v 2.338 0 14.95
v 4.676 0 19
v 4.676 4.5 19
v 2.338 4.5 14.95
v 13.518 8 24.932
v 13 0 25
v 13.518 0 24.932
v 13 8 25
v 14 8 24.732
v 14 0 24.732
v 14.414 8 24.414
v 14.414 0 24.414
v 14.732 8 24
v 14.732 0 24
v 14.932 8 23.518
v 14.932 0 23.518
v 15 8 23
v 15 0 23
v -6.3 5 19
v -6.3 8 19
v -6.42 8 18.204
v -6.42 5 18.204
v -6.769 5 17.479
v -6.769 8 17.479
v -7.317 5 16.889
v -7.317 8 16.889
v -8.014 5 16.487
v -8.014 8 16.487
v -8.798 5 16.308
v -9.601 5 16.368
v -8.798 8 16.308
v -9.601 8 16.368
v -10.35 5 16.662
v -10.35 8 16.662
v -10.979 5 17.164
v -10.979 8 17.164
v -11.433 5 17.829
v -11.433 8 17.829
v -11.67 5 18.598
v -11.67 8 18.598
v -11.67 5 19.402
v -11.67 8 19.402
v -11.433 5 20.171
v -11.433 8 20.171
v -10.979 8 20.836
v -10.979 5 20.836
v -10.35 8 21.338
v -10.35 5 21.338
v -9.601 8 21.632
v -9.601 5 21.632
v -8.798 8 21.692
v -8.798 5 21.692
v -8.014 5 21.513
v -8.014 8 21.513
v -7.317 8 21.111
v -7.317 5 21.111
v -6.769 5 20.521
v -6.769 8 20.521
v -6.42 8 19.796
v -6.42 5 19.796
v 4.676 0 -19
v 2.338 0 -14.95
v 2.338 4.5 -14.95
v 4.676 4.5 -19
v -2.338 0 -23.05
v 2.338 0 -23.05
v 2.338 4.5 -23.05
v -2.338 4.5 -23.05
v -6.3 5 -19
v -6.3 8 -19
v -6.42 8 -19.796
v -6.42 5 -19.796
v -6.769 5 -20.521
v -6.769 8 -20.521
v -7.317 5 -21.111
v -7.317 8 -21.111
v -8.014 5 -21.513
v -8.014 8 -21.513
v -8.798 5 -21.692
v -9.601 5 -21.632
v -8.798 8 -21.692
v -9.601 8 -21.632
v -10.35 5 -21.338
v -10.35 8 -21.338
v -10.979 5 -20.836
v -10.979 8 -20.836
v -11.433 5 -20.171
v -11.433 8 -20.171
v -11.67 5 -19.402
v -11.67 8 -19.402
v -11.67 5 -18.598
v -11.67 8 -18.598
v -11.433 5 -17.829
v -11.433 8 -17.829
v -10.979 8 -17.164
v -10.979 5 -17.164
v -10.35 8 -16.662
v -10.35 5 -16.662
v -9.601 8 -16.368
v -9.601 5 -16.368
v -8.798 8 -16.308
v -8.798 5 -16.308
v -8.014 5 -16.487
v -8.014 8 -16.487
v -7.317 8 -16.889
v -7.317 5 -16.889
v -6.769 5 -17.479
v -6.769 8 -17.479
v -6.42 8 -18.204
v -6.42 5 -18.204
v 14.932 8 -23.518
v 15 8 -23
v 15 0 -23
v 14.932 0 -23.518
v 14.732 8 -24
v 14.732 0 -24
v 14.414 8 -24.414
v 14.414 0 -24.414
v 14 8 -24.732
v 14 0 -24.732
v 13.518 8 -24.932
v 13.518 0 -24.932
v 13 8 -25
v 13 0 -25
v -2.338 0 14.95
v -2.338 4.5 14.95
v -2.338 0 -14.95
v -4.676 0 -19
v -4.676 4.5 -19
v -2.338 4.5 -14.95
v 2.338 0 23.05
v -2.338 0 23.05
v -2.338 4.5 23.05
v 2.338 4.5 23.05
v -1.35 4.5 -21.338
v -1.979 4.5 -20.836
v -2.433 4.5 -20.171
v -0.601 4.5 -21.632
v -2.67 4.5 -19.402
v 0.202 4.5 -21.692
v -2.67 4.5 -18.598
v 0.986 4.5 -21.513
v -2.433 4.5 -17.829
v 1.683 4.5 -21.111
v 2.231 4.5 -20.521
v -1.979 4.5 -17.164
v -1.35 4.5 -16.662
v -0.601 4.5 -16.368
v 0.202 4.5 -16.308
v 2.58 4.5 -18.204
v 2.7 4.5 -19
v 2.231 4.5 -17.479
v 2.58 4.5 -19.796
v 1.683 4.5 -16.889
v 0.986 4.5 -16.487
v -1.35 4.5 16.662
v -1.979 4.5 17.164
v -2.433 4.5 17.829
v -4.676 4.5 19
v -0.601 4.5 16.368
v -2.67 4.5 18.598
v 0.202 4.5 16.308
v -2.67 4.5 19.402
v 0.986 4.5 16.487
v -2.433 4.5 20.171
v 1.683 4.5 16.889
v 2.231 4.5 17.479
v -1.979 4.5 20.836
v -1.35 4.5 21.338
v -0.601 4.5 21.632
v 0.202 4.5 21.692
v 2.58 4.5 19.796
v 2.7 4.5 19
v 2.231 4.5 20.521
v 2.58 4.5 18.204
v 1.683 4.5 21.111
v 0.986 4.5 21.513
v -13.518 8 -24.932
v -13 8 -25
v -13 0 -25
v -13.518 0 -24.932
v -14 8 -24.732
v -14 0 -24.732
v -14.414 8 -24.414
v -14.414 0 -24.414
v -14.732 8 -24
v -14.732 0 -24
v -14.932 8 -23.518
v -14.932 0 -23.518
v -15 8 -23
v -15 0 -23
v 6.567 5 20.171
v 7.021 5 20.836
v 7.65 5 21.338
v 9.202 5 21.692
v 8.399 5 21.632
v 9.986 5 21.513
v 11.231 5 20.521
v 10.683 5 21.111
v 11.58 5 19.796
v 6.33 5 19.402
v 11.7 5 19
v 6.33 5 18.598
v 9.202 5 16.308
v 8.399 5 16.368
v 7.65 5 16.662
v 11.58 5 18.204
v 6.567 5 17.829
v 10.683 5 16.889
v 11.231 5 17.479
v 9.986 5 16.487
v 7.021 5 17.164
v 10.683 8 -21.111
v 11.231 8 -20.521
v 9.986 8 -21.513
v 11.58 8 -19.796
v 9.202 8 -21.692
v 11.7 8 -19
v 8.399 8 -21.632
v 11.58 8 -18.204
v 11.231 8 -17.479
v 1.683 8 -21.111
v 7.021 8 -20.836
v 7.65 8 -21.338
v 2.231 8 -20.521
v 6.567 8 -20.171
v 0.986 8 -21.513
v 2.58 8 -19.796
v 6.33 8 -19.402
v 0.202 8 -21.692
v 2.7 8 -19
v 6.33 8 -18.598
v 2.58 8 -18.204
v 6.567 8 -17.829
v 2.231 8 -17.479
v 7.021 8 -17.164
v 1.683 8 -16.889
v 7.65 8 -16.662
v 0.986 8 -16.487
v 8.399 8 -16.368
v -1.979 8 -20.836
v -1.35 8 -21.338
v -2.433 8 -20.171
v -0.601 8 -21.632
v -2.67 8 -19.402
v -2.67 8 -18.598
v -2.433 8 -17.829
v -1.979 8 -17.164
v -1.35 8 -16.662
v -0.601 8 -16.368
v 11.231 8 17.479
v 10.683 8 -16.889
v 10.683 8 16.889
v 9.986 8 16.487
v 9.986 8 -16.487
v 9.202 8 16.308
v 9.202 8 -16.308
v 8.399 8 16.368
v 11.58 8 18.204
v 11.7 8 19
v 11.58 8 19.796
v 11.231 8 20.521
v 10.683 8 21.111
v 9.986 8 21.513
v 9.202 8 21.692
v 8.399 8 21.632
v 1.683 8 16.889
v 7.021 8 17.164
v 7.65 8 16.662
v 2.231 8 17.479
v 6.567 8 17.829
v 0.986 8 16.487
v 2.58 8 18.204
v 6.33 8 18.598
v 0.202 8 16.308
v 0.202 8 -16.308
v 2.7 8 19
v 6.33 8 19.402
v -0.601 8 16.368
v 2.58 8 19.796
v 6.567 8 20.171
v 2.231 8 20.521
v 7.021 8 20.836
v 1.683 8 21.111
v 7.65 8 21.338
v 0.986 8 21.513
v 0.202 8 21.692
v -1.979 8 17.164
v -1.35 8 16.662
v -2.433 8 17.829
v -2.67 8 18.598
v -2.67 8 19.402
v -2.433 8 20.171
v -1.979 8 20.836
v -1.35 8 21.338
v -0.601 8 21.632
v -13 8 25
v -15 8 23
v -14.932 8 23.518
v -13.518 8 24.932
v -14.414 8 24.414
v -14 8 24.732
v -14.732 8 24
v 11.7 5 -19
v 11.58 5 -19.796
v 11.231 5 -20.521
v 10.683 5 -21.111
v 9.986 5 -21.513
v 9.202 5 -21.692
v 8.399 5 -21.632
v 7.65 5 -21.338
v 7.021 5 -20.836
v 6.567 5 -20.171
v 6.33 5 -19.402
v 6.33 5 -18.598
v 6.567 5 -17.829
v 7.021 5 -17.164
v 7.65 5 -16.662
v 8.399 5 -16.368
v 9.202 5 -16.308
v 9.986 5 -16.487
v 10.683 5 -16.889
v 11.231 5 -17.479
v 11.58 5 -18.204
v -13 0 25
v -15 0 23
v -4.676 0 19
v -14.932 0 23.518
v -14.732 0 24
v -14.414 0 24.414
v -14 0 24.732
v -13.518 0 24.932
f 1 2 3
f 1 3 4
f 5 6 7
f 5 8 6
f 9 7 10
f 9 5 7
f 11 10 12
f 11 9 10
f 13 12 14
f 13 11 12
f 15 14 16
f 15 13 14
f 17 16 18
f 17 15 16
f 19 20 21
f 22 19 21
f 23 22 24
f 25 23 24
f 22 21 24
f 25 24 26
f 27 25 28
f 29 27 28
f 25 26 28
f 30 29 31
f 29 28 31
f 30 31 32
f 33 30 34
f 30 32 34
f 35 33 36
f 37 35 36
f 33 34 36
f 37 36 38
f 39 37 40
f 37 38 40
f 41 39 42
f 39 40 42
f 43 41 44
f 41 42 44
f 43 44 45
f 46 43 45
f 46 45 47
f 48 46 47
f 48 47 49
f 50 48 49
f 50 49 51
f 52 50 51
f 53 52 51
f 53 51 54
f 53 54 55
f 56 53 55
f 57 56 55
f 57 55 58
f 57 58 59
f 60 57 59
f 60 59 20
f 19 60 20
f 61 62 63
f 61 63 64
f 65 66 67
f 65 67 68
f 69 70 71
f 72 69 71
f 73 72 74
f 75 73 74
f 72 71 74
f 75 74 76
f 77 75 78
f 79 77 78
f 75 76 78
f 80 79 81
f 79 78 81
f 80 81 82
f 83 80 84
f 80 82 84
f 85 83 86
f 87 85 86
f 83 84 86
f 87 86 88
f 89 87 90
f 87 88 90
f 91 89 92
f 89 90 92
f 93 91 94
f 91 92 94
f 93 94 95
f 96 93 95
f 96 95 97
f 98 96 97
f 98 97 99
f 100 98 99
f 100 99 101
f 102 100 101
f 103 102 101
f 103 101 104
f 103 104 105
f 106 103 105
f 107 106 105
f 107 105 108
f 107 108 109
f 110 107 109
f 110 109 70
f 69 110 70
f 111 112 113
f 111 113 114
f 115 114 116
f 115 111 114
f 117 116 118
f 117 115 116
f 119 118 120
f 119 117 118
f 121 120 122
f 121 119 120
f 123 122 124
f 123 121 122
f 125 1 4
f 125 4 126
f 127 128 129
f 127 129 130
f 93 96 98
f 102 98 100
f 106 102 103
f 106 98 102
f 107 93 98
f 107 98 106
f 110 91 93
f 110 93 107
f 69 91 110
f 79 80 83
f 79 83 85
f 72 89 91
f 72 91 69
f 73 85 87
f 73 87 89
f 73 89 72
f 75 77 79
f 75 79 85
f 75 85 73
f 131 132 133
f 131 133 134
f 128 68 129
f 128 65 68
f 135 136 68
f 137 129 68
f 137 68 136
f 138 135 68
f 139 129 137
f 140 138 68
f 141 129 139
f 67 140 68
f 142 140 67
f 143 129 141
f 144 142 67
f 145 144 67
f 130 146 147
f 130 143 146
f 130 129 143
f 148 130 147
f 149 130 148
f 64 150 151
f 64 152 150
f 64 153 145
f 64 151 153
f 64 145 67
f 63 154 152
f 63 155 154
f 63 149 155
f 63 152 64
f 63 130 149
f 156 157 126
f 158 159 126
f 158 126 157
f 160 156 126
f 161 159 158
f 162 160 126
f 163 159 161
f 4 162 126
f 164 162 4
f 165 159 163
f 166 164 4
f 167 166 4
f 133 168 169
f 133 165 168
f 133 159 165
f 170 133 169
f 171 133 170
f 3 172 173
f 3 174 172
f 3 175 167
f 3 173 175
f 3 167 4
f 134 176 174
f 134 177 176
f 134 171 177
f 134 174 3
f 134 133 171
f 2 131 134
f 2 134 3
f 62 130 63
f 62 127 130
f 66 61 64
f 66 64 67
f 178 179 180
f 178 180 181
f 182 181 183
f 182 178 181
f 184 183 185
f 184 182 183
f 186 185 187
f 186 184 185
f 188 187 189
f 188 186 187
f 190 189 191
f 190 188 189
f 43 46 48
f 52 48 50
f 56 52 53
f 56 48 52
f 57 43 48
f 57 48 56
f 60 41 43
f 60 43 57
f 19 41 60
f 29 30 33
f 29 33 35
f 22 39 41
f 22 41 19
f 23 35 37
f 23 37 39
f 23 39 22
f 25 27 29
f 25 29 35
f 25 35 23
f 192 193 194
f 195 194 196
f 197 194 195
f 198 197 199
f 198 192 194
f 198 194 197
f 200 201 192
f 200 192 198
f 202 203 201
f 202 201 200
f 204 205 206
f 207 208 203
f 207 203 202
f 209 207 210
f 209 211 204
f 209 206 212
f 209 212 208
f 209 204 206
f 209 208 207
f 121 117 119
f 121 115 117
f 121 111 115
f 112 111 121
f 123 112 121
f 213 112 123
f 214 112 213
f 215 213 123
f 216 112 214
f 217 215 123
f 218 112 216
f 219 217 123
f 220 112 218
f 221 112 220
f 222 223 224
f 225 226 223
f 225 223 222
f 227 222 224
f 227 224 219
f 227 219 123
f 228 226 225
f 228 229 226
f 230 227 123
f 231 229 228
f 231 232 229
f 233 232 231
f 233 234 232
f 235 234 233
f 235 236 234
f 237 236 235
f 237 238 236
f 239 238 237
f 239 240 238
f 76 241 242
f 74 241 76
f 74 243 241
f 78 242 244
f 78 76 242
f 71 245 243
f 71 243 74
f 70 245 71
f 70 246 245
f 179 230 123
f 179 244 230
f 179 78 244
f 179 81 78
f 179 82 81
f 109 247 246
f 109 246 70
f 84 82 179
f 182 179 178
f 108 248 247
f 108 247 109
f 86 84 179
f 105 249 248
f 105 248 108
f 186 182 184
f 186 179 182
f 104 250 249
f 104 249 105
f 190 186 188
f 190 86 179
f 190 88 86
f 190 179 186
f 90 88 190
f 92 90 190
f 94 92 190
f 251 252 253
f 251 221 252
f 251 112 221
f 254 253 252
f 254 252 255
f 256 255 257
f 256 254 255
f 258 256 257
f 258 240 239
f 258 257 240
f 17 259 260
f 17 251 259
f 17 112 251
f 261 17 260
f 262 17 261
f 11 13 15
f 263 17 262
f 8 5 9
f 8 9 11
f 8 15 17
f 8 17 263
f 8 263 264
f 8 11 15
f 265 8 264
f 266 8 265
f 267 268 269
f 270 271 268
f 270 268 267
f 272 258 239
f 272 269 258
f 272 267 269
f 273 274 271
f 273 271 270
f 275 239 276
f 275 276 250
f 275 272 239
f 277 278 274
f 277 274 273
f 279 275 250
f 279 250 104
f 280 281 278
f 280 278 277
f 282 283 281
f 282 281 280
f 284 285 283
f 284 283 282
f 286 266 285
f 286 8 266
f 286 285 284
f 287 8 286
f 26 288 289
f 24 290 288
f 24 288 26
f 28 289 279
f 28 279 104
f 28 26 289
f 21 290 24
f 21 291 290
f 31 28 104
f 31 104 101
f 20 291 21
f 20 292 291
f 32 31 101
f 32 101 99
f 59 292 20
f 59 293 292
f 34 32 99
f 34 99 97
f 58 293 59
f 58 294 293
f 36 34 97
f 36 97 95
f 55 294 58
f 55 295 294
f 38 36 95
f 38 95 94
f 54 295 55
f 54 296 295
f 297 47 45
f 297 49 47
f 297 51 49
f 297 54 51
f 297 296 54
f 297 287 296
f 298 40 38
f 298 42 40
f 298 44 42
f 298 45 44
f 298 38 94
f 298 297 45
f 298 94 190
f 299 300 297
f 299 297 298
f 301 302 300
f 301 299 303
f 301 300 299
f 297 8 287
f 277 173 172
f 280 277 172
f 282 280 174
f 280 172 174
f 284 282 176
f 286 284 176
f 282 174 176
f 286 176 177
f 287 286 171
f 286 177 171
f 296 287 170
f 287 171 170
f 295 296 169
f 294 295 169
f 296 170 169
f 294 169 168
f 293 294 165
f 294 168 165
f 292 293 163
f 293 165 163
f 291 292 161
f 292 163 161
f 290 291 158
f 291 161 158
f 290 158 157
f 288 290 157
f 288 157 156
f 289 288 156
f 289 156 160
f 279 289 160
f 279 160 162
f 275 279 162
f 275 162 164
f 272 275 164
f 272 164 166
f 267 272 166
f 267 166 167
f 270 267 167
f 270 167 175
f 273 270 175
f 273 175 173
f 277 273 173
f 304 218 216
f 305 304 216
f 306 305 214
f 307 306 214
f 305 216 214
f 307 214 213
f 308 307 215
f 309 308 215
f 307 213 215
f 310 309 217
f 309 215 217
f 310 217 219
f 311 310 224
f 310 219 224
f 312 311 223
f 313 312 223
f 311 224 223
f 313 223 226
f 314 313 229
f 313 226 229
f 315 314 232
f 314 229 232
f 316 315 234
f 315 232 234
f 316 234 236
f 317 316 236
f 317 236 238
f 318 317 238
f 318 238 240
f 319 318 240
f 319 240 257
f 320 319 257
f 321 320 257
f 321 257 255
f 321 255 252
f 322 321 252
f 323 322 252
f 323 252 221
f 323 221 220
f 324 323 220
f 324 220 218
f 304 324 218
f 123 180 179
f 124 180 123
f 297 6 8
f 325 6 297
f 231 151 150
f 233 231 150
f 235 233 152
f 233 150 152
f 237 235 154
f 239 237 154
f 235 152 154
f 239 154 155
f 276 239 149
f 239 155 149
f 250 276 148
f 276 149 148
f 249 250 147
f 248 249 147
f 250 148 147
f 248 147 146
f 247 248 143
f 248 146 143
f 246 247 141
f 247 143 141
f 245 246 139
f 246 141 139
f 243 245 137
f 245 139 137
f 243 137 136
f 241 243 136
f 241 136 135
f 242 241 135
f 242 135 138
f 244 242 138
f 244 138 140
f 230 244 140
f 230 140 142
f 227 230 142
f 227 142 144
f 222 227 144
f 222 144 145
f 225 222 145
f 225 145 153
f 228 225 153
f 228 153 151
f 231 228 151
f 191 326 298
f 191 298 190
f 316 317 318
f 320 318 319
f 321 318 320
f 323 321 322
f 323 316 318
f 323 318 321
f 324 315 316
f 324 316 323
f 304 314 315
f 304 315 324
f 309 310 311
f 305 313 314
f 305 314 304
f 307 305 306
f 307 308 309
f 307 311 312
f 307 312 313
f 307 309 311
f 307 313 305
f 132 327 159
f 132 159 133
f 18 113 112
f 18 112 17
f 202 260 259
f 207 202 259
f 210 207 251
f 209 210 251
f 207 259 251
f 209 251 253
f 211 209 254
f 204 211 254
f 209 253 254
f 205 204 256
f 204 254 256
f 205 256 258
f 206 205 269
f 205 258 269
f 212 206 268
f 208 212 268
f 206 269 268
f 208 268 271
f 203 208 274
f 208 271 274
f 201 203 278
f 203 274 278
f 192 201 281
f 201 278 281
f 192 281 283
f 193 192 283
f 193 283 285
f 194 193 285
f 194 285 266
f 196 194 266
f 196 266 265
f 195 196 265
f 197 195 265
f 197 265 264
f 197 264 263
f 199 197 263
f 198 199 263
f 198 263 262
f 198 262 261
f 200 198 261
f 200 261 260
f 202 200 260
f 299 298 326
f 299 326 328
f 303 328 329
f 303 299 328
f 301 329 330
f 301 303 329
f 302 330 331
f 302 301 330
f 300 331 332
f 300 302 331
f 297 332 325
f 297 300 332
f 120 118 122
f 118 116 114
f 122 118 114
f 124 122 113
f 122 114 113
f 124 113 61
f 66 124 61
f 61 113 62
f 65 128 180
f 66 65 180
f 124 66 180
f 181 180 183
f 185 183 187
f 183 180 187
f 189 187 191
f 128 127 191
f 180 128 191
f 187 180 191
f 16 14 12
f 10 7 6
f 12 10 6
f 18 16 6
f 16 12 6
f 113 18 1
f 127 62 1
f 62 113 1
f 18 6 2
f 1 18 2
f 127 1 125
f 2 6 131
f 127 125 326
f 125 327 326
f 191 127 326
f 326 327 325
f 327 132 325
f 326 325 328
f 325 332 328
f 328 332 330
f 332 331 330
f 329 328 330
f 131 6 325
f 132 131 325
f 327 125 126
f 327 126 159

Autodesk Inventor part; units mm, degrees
ref_plane "YZ Plane" through (0, 0, 0) normal (1, 0, 0) x (0, 1, 0)
ref_plane "XZ Plane" through (0, 0, 0) normal (0, 1, 0) x (-1, 0, 0)
ref_plane "XY Plane" through (0, 0, 0) normal (0, 0, 1) x (1, 0, 0)
sketch "Boceto1" plane through (0, 0, 0) normal (0, 1, 0) x (-1, 0, 0)
  line L0 (-15, 25) -> (15, 25)
  line L1 (15, 25) -> (15, -25)
  line L2 (15, -25) -> (-15, -25)
  line L3 (-15, -25) -> (-15, 25)
  line L4 (-15, 25) -> (15, -25) construction
  line L5 (15, 25) -> (-15, -25) construction
  point P0 (0, 0)
  dimension "d0" = 50
  dimension "d1" = 30
extrude "Extrusión1" add sketch "Boceto1" along normal blind 8
fillet "Empalme1" radius 2 4 edges at (15, 4, 25) (-15, 4, 25) (15, 4, -25) (-15, 4, -25)
sketch "Boceto2" plane through (0, 8, 0) normal (0, 1, 0) x (1, 0, 0)
  circle A0 centre (-9, 19) radius 2.7
  circle A1 centre (9, 19) radius 2.7
  circle A2 centre (9, -19) radius 2.7
  circle A3 centre (-9, -19) radius 2.7
  line L0 (13, 25) -> (-13, 25) projected
  line L1 (-15, 23) -> (-15, -23) projected
  line L2 (15, -23) -> (15, 23) projected
  line L3 (-13, -25) -> (13, -25) projected
  point P0 (0, 0)
  dimension "d5" = 5.4
  dimension "d6" = 6
  dimension "d7" = 6
  dimension "d8" = 6
  dimension "d9" = 6
extrude "Extrusión2" cut sketch "Boceto2" against normal blind 3
sketch "Boceto3" plane through (0, 0, 0) normal (0, -1, 0) x (1, 0, 0)
  circle A0 centre (0, 19) radius 2.7
  circle A1 centre (0, -19) radius 2.7
  circle A2 centre (-9, -19) radius 2.7 projected
  circle A3 centre (-9, 19) radius 2.7 projected
  point P0 (0, 0)
  dimension "d12" = 5.4
extrude "Extrusión3" cut sketch "Boceto3" against normal through all contours A0 | A1
sketch "Boceto4" plane through (0, 0, 0) normal (0, -1, 0) x (1, 0, 0)
  circle A0 centre (0, -19) radius 2.7 projected
  circle A1 centre (0, -19) radius 4.05
  line L0 (2.3383, -14.95) -> (4.6765, -19)
  line L1 (4.6765, -19) -> (2.3383, -23.05)
  line L2 (2.3383, -23.05) -> (-2.3383, -23.05)
  line L3 (-2.3383, -23.05) -> (-4.6765, -19)
  line L4 (-4.6765, -19) -> (-2.3383, -14.95)
  line L5 (-2.3383, -14.95) -> (2.3383, -14.95)
  circle A2 centre (0, 19) radius 4.05
  line L6 (-4.6765, 19) -> (-2.3383, 23.05)
  line L7 (-2.3383, 23.05) -> (2.3383, 23.05)
  line L8 (2.3383, 23.05) -> (4.6765, 19)
  line L9 (4.6765, 19) -> (2.3383, 14.95)
  line L10 (2.3383, 14.95) -> (-2.3383, 14.95)
  line L11 (-2.3383, 14.95) -> (-4.6765, 19)
  point P0 (0, 0)
  dimension "d15" = 8.1
extrude "Extrusión4" cut sketch "Boceto4" against normal blind 4.5 contours A0 | A1 | A1 L0 L1 | A1 L5 L0 | L1 L2 A1 | A1 L4 L5 | L2 L3 A1 | A1 L3 L4 | A2 | A2 L8 L9 | A2 L7 L8 | L9 L10 A2 | A2 L6 L7 | L10 L11 A2 | A2 L11 L6
properties part number "ViseB"
